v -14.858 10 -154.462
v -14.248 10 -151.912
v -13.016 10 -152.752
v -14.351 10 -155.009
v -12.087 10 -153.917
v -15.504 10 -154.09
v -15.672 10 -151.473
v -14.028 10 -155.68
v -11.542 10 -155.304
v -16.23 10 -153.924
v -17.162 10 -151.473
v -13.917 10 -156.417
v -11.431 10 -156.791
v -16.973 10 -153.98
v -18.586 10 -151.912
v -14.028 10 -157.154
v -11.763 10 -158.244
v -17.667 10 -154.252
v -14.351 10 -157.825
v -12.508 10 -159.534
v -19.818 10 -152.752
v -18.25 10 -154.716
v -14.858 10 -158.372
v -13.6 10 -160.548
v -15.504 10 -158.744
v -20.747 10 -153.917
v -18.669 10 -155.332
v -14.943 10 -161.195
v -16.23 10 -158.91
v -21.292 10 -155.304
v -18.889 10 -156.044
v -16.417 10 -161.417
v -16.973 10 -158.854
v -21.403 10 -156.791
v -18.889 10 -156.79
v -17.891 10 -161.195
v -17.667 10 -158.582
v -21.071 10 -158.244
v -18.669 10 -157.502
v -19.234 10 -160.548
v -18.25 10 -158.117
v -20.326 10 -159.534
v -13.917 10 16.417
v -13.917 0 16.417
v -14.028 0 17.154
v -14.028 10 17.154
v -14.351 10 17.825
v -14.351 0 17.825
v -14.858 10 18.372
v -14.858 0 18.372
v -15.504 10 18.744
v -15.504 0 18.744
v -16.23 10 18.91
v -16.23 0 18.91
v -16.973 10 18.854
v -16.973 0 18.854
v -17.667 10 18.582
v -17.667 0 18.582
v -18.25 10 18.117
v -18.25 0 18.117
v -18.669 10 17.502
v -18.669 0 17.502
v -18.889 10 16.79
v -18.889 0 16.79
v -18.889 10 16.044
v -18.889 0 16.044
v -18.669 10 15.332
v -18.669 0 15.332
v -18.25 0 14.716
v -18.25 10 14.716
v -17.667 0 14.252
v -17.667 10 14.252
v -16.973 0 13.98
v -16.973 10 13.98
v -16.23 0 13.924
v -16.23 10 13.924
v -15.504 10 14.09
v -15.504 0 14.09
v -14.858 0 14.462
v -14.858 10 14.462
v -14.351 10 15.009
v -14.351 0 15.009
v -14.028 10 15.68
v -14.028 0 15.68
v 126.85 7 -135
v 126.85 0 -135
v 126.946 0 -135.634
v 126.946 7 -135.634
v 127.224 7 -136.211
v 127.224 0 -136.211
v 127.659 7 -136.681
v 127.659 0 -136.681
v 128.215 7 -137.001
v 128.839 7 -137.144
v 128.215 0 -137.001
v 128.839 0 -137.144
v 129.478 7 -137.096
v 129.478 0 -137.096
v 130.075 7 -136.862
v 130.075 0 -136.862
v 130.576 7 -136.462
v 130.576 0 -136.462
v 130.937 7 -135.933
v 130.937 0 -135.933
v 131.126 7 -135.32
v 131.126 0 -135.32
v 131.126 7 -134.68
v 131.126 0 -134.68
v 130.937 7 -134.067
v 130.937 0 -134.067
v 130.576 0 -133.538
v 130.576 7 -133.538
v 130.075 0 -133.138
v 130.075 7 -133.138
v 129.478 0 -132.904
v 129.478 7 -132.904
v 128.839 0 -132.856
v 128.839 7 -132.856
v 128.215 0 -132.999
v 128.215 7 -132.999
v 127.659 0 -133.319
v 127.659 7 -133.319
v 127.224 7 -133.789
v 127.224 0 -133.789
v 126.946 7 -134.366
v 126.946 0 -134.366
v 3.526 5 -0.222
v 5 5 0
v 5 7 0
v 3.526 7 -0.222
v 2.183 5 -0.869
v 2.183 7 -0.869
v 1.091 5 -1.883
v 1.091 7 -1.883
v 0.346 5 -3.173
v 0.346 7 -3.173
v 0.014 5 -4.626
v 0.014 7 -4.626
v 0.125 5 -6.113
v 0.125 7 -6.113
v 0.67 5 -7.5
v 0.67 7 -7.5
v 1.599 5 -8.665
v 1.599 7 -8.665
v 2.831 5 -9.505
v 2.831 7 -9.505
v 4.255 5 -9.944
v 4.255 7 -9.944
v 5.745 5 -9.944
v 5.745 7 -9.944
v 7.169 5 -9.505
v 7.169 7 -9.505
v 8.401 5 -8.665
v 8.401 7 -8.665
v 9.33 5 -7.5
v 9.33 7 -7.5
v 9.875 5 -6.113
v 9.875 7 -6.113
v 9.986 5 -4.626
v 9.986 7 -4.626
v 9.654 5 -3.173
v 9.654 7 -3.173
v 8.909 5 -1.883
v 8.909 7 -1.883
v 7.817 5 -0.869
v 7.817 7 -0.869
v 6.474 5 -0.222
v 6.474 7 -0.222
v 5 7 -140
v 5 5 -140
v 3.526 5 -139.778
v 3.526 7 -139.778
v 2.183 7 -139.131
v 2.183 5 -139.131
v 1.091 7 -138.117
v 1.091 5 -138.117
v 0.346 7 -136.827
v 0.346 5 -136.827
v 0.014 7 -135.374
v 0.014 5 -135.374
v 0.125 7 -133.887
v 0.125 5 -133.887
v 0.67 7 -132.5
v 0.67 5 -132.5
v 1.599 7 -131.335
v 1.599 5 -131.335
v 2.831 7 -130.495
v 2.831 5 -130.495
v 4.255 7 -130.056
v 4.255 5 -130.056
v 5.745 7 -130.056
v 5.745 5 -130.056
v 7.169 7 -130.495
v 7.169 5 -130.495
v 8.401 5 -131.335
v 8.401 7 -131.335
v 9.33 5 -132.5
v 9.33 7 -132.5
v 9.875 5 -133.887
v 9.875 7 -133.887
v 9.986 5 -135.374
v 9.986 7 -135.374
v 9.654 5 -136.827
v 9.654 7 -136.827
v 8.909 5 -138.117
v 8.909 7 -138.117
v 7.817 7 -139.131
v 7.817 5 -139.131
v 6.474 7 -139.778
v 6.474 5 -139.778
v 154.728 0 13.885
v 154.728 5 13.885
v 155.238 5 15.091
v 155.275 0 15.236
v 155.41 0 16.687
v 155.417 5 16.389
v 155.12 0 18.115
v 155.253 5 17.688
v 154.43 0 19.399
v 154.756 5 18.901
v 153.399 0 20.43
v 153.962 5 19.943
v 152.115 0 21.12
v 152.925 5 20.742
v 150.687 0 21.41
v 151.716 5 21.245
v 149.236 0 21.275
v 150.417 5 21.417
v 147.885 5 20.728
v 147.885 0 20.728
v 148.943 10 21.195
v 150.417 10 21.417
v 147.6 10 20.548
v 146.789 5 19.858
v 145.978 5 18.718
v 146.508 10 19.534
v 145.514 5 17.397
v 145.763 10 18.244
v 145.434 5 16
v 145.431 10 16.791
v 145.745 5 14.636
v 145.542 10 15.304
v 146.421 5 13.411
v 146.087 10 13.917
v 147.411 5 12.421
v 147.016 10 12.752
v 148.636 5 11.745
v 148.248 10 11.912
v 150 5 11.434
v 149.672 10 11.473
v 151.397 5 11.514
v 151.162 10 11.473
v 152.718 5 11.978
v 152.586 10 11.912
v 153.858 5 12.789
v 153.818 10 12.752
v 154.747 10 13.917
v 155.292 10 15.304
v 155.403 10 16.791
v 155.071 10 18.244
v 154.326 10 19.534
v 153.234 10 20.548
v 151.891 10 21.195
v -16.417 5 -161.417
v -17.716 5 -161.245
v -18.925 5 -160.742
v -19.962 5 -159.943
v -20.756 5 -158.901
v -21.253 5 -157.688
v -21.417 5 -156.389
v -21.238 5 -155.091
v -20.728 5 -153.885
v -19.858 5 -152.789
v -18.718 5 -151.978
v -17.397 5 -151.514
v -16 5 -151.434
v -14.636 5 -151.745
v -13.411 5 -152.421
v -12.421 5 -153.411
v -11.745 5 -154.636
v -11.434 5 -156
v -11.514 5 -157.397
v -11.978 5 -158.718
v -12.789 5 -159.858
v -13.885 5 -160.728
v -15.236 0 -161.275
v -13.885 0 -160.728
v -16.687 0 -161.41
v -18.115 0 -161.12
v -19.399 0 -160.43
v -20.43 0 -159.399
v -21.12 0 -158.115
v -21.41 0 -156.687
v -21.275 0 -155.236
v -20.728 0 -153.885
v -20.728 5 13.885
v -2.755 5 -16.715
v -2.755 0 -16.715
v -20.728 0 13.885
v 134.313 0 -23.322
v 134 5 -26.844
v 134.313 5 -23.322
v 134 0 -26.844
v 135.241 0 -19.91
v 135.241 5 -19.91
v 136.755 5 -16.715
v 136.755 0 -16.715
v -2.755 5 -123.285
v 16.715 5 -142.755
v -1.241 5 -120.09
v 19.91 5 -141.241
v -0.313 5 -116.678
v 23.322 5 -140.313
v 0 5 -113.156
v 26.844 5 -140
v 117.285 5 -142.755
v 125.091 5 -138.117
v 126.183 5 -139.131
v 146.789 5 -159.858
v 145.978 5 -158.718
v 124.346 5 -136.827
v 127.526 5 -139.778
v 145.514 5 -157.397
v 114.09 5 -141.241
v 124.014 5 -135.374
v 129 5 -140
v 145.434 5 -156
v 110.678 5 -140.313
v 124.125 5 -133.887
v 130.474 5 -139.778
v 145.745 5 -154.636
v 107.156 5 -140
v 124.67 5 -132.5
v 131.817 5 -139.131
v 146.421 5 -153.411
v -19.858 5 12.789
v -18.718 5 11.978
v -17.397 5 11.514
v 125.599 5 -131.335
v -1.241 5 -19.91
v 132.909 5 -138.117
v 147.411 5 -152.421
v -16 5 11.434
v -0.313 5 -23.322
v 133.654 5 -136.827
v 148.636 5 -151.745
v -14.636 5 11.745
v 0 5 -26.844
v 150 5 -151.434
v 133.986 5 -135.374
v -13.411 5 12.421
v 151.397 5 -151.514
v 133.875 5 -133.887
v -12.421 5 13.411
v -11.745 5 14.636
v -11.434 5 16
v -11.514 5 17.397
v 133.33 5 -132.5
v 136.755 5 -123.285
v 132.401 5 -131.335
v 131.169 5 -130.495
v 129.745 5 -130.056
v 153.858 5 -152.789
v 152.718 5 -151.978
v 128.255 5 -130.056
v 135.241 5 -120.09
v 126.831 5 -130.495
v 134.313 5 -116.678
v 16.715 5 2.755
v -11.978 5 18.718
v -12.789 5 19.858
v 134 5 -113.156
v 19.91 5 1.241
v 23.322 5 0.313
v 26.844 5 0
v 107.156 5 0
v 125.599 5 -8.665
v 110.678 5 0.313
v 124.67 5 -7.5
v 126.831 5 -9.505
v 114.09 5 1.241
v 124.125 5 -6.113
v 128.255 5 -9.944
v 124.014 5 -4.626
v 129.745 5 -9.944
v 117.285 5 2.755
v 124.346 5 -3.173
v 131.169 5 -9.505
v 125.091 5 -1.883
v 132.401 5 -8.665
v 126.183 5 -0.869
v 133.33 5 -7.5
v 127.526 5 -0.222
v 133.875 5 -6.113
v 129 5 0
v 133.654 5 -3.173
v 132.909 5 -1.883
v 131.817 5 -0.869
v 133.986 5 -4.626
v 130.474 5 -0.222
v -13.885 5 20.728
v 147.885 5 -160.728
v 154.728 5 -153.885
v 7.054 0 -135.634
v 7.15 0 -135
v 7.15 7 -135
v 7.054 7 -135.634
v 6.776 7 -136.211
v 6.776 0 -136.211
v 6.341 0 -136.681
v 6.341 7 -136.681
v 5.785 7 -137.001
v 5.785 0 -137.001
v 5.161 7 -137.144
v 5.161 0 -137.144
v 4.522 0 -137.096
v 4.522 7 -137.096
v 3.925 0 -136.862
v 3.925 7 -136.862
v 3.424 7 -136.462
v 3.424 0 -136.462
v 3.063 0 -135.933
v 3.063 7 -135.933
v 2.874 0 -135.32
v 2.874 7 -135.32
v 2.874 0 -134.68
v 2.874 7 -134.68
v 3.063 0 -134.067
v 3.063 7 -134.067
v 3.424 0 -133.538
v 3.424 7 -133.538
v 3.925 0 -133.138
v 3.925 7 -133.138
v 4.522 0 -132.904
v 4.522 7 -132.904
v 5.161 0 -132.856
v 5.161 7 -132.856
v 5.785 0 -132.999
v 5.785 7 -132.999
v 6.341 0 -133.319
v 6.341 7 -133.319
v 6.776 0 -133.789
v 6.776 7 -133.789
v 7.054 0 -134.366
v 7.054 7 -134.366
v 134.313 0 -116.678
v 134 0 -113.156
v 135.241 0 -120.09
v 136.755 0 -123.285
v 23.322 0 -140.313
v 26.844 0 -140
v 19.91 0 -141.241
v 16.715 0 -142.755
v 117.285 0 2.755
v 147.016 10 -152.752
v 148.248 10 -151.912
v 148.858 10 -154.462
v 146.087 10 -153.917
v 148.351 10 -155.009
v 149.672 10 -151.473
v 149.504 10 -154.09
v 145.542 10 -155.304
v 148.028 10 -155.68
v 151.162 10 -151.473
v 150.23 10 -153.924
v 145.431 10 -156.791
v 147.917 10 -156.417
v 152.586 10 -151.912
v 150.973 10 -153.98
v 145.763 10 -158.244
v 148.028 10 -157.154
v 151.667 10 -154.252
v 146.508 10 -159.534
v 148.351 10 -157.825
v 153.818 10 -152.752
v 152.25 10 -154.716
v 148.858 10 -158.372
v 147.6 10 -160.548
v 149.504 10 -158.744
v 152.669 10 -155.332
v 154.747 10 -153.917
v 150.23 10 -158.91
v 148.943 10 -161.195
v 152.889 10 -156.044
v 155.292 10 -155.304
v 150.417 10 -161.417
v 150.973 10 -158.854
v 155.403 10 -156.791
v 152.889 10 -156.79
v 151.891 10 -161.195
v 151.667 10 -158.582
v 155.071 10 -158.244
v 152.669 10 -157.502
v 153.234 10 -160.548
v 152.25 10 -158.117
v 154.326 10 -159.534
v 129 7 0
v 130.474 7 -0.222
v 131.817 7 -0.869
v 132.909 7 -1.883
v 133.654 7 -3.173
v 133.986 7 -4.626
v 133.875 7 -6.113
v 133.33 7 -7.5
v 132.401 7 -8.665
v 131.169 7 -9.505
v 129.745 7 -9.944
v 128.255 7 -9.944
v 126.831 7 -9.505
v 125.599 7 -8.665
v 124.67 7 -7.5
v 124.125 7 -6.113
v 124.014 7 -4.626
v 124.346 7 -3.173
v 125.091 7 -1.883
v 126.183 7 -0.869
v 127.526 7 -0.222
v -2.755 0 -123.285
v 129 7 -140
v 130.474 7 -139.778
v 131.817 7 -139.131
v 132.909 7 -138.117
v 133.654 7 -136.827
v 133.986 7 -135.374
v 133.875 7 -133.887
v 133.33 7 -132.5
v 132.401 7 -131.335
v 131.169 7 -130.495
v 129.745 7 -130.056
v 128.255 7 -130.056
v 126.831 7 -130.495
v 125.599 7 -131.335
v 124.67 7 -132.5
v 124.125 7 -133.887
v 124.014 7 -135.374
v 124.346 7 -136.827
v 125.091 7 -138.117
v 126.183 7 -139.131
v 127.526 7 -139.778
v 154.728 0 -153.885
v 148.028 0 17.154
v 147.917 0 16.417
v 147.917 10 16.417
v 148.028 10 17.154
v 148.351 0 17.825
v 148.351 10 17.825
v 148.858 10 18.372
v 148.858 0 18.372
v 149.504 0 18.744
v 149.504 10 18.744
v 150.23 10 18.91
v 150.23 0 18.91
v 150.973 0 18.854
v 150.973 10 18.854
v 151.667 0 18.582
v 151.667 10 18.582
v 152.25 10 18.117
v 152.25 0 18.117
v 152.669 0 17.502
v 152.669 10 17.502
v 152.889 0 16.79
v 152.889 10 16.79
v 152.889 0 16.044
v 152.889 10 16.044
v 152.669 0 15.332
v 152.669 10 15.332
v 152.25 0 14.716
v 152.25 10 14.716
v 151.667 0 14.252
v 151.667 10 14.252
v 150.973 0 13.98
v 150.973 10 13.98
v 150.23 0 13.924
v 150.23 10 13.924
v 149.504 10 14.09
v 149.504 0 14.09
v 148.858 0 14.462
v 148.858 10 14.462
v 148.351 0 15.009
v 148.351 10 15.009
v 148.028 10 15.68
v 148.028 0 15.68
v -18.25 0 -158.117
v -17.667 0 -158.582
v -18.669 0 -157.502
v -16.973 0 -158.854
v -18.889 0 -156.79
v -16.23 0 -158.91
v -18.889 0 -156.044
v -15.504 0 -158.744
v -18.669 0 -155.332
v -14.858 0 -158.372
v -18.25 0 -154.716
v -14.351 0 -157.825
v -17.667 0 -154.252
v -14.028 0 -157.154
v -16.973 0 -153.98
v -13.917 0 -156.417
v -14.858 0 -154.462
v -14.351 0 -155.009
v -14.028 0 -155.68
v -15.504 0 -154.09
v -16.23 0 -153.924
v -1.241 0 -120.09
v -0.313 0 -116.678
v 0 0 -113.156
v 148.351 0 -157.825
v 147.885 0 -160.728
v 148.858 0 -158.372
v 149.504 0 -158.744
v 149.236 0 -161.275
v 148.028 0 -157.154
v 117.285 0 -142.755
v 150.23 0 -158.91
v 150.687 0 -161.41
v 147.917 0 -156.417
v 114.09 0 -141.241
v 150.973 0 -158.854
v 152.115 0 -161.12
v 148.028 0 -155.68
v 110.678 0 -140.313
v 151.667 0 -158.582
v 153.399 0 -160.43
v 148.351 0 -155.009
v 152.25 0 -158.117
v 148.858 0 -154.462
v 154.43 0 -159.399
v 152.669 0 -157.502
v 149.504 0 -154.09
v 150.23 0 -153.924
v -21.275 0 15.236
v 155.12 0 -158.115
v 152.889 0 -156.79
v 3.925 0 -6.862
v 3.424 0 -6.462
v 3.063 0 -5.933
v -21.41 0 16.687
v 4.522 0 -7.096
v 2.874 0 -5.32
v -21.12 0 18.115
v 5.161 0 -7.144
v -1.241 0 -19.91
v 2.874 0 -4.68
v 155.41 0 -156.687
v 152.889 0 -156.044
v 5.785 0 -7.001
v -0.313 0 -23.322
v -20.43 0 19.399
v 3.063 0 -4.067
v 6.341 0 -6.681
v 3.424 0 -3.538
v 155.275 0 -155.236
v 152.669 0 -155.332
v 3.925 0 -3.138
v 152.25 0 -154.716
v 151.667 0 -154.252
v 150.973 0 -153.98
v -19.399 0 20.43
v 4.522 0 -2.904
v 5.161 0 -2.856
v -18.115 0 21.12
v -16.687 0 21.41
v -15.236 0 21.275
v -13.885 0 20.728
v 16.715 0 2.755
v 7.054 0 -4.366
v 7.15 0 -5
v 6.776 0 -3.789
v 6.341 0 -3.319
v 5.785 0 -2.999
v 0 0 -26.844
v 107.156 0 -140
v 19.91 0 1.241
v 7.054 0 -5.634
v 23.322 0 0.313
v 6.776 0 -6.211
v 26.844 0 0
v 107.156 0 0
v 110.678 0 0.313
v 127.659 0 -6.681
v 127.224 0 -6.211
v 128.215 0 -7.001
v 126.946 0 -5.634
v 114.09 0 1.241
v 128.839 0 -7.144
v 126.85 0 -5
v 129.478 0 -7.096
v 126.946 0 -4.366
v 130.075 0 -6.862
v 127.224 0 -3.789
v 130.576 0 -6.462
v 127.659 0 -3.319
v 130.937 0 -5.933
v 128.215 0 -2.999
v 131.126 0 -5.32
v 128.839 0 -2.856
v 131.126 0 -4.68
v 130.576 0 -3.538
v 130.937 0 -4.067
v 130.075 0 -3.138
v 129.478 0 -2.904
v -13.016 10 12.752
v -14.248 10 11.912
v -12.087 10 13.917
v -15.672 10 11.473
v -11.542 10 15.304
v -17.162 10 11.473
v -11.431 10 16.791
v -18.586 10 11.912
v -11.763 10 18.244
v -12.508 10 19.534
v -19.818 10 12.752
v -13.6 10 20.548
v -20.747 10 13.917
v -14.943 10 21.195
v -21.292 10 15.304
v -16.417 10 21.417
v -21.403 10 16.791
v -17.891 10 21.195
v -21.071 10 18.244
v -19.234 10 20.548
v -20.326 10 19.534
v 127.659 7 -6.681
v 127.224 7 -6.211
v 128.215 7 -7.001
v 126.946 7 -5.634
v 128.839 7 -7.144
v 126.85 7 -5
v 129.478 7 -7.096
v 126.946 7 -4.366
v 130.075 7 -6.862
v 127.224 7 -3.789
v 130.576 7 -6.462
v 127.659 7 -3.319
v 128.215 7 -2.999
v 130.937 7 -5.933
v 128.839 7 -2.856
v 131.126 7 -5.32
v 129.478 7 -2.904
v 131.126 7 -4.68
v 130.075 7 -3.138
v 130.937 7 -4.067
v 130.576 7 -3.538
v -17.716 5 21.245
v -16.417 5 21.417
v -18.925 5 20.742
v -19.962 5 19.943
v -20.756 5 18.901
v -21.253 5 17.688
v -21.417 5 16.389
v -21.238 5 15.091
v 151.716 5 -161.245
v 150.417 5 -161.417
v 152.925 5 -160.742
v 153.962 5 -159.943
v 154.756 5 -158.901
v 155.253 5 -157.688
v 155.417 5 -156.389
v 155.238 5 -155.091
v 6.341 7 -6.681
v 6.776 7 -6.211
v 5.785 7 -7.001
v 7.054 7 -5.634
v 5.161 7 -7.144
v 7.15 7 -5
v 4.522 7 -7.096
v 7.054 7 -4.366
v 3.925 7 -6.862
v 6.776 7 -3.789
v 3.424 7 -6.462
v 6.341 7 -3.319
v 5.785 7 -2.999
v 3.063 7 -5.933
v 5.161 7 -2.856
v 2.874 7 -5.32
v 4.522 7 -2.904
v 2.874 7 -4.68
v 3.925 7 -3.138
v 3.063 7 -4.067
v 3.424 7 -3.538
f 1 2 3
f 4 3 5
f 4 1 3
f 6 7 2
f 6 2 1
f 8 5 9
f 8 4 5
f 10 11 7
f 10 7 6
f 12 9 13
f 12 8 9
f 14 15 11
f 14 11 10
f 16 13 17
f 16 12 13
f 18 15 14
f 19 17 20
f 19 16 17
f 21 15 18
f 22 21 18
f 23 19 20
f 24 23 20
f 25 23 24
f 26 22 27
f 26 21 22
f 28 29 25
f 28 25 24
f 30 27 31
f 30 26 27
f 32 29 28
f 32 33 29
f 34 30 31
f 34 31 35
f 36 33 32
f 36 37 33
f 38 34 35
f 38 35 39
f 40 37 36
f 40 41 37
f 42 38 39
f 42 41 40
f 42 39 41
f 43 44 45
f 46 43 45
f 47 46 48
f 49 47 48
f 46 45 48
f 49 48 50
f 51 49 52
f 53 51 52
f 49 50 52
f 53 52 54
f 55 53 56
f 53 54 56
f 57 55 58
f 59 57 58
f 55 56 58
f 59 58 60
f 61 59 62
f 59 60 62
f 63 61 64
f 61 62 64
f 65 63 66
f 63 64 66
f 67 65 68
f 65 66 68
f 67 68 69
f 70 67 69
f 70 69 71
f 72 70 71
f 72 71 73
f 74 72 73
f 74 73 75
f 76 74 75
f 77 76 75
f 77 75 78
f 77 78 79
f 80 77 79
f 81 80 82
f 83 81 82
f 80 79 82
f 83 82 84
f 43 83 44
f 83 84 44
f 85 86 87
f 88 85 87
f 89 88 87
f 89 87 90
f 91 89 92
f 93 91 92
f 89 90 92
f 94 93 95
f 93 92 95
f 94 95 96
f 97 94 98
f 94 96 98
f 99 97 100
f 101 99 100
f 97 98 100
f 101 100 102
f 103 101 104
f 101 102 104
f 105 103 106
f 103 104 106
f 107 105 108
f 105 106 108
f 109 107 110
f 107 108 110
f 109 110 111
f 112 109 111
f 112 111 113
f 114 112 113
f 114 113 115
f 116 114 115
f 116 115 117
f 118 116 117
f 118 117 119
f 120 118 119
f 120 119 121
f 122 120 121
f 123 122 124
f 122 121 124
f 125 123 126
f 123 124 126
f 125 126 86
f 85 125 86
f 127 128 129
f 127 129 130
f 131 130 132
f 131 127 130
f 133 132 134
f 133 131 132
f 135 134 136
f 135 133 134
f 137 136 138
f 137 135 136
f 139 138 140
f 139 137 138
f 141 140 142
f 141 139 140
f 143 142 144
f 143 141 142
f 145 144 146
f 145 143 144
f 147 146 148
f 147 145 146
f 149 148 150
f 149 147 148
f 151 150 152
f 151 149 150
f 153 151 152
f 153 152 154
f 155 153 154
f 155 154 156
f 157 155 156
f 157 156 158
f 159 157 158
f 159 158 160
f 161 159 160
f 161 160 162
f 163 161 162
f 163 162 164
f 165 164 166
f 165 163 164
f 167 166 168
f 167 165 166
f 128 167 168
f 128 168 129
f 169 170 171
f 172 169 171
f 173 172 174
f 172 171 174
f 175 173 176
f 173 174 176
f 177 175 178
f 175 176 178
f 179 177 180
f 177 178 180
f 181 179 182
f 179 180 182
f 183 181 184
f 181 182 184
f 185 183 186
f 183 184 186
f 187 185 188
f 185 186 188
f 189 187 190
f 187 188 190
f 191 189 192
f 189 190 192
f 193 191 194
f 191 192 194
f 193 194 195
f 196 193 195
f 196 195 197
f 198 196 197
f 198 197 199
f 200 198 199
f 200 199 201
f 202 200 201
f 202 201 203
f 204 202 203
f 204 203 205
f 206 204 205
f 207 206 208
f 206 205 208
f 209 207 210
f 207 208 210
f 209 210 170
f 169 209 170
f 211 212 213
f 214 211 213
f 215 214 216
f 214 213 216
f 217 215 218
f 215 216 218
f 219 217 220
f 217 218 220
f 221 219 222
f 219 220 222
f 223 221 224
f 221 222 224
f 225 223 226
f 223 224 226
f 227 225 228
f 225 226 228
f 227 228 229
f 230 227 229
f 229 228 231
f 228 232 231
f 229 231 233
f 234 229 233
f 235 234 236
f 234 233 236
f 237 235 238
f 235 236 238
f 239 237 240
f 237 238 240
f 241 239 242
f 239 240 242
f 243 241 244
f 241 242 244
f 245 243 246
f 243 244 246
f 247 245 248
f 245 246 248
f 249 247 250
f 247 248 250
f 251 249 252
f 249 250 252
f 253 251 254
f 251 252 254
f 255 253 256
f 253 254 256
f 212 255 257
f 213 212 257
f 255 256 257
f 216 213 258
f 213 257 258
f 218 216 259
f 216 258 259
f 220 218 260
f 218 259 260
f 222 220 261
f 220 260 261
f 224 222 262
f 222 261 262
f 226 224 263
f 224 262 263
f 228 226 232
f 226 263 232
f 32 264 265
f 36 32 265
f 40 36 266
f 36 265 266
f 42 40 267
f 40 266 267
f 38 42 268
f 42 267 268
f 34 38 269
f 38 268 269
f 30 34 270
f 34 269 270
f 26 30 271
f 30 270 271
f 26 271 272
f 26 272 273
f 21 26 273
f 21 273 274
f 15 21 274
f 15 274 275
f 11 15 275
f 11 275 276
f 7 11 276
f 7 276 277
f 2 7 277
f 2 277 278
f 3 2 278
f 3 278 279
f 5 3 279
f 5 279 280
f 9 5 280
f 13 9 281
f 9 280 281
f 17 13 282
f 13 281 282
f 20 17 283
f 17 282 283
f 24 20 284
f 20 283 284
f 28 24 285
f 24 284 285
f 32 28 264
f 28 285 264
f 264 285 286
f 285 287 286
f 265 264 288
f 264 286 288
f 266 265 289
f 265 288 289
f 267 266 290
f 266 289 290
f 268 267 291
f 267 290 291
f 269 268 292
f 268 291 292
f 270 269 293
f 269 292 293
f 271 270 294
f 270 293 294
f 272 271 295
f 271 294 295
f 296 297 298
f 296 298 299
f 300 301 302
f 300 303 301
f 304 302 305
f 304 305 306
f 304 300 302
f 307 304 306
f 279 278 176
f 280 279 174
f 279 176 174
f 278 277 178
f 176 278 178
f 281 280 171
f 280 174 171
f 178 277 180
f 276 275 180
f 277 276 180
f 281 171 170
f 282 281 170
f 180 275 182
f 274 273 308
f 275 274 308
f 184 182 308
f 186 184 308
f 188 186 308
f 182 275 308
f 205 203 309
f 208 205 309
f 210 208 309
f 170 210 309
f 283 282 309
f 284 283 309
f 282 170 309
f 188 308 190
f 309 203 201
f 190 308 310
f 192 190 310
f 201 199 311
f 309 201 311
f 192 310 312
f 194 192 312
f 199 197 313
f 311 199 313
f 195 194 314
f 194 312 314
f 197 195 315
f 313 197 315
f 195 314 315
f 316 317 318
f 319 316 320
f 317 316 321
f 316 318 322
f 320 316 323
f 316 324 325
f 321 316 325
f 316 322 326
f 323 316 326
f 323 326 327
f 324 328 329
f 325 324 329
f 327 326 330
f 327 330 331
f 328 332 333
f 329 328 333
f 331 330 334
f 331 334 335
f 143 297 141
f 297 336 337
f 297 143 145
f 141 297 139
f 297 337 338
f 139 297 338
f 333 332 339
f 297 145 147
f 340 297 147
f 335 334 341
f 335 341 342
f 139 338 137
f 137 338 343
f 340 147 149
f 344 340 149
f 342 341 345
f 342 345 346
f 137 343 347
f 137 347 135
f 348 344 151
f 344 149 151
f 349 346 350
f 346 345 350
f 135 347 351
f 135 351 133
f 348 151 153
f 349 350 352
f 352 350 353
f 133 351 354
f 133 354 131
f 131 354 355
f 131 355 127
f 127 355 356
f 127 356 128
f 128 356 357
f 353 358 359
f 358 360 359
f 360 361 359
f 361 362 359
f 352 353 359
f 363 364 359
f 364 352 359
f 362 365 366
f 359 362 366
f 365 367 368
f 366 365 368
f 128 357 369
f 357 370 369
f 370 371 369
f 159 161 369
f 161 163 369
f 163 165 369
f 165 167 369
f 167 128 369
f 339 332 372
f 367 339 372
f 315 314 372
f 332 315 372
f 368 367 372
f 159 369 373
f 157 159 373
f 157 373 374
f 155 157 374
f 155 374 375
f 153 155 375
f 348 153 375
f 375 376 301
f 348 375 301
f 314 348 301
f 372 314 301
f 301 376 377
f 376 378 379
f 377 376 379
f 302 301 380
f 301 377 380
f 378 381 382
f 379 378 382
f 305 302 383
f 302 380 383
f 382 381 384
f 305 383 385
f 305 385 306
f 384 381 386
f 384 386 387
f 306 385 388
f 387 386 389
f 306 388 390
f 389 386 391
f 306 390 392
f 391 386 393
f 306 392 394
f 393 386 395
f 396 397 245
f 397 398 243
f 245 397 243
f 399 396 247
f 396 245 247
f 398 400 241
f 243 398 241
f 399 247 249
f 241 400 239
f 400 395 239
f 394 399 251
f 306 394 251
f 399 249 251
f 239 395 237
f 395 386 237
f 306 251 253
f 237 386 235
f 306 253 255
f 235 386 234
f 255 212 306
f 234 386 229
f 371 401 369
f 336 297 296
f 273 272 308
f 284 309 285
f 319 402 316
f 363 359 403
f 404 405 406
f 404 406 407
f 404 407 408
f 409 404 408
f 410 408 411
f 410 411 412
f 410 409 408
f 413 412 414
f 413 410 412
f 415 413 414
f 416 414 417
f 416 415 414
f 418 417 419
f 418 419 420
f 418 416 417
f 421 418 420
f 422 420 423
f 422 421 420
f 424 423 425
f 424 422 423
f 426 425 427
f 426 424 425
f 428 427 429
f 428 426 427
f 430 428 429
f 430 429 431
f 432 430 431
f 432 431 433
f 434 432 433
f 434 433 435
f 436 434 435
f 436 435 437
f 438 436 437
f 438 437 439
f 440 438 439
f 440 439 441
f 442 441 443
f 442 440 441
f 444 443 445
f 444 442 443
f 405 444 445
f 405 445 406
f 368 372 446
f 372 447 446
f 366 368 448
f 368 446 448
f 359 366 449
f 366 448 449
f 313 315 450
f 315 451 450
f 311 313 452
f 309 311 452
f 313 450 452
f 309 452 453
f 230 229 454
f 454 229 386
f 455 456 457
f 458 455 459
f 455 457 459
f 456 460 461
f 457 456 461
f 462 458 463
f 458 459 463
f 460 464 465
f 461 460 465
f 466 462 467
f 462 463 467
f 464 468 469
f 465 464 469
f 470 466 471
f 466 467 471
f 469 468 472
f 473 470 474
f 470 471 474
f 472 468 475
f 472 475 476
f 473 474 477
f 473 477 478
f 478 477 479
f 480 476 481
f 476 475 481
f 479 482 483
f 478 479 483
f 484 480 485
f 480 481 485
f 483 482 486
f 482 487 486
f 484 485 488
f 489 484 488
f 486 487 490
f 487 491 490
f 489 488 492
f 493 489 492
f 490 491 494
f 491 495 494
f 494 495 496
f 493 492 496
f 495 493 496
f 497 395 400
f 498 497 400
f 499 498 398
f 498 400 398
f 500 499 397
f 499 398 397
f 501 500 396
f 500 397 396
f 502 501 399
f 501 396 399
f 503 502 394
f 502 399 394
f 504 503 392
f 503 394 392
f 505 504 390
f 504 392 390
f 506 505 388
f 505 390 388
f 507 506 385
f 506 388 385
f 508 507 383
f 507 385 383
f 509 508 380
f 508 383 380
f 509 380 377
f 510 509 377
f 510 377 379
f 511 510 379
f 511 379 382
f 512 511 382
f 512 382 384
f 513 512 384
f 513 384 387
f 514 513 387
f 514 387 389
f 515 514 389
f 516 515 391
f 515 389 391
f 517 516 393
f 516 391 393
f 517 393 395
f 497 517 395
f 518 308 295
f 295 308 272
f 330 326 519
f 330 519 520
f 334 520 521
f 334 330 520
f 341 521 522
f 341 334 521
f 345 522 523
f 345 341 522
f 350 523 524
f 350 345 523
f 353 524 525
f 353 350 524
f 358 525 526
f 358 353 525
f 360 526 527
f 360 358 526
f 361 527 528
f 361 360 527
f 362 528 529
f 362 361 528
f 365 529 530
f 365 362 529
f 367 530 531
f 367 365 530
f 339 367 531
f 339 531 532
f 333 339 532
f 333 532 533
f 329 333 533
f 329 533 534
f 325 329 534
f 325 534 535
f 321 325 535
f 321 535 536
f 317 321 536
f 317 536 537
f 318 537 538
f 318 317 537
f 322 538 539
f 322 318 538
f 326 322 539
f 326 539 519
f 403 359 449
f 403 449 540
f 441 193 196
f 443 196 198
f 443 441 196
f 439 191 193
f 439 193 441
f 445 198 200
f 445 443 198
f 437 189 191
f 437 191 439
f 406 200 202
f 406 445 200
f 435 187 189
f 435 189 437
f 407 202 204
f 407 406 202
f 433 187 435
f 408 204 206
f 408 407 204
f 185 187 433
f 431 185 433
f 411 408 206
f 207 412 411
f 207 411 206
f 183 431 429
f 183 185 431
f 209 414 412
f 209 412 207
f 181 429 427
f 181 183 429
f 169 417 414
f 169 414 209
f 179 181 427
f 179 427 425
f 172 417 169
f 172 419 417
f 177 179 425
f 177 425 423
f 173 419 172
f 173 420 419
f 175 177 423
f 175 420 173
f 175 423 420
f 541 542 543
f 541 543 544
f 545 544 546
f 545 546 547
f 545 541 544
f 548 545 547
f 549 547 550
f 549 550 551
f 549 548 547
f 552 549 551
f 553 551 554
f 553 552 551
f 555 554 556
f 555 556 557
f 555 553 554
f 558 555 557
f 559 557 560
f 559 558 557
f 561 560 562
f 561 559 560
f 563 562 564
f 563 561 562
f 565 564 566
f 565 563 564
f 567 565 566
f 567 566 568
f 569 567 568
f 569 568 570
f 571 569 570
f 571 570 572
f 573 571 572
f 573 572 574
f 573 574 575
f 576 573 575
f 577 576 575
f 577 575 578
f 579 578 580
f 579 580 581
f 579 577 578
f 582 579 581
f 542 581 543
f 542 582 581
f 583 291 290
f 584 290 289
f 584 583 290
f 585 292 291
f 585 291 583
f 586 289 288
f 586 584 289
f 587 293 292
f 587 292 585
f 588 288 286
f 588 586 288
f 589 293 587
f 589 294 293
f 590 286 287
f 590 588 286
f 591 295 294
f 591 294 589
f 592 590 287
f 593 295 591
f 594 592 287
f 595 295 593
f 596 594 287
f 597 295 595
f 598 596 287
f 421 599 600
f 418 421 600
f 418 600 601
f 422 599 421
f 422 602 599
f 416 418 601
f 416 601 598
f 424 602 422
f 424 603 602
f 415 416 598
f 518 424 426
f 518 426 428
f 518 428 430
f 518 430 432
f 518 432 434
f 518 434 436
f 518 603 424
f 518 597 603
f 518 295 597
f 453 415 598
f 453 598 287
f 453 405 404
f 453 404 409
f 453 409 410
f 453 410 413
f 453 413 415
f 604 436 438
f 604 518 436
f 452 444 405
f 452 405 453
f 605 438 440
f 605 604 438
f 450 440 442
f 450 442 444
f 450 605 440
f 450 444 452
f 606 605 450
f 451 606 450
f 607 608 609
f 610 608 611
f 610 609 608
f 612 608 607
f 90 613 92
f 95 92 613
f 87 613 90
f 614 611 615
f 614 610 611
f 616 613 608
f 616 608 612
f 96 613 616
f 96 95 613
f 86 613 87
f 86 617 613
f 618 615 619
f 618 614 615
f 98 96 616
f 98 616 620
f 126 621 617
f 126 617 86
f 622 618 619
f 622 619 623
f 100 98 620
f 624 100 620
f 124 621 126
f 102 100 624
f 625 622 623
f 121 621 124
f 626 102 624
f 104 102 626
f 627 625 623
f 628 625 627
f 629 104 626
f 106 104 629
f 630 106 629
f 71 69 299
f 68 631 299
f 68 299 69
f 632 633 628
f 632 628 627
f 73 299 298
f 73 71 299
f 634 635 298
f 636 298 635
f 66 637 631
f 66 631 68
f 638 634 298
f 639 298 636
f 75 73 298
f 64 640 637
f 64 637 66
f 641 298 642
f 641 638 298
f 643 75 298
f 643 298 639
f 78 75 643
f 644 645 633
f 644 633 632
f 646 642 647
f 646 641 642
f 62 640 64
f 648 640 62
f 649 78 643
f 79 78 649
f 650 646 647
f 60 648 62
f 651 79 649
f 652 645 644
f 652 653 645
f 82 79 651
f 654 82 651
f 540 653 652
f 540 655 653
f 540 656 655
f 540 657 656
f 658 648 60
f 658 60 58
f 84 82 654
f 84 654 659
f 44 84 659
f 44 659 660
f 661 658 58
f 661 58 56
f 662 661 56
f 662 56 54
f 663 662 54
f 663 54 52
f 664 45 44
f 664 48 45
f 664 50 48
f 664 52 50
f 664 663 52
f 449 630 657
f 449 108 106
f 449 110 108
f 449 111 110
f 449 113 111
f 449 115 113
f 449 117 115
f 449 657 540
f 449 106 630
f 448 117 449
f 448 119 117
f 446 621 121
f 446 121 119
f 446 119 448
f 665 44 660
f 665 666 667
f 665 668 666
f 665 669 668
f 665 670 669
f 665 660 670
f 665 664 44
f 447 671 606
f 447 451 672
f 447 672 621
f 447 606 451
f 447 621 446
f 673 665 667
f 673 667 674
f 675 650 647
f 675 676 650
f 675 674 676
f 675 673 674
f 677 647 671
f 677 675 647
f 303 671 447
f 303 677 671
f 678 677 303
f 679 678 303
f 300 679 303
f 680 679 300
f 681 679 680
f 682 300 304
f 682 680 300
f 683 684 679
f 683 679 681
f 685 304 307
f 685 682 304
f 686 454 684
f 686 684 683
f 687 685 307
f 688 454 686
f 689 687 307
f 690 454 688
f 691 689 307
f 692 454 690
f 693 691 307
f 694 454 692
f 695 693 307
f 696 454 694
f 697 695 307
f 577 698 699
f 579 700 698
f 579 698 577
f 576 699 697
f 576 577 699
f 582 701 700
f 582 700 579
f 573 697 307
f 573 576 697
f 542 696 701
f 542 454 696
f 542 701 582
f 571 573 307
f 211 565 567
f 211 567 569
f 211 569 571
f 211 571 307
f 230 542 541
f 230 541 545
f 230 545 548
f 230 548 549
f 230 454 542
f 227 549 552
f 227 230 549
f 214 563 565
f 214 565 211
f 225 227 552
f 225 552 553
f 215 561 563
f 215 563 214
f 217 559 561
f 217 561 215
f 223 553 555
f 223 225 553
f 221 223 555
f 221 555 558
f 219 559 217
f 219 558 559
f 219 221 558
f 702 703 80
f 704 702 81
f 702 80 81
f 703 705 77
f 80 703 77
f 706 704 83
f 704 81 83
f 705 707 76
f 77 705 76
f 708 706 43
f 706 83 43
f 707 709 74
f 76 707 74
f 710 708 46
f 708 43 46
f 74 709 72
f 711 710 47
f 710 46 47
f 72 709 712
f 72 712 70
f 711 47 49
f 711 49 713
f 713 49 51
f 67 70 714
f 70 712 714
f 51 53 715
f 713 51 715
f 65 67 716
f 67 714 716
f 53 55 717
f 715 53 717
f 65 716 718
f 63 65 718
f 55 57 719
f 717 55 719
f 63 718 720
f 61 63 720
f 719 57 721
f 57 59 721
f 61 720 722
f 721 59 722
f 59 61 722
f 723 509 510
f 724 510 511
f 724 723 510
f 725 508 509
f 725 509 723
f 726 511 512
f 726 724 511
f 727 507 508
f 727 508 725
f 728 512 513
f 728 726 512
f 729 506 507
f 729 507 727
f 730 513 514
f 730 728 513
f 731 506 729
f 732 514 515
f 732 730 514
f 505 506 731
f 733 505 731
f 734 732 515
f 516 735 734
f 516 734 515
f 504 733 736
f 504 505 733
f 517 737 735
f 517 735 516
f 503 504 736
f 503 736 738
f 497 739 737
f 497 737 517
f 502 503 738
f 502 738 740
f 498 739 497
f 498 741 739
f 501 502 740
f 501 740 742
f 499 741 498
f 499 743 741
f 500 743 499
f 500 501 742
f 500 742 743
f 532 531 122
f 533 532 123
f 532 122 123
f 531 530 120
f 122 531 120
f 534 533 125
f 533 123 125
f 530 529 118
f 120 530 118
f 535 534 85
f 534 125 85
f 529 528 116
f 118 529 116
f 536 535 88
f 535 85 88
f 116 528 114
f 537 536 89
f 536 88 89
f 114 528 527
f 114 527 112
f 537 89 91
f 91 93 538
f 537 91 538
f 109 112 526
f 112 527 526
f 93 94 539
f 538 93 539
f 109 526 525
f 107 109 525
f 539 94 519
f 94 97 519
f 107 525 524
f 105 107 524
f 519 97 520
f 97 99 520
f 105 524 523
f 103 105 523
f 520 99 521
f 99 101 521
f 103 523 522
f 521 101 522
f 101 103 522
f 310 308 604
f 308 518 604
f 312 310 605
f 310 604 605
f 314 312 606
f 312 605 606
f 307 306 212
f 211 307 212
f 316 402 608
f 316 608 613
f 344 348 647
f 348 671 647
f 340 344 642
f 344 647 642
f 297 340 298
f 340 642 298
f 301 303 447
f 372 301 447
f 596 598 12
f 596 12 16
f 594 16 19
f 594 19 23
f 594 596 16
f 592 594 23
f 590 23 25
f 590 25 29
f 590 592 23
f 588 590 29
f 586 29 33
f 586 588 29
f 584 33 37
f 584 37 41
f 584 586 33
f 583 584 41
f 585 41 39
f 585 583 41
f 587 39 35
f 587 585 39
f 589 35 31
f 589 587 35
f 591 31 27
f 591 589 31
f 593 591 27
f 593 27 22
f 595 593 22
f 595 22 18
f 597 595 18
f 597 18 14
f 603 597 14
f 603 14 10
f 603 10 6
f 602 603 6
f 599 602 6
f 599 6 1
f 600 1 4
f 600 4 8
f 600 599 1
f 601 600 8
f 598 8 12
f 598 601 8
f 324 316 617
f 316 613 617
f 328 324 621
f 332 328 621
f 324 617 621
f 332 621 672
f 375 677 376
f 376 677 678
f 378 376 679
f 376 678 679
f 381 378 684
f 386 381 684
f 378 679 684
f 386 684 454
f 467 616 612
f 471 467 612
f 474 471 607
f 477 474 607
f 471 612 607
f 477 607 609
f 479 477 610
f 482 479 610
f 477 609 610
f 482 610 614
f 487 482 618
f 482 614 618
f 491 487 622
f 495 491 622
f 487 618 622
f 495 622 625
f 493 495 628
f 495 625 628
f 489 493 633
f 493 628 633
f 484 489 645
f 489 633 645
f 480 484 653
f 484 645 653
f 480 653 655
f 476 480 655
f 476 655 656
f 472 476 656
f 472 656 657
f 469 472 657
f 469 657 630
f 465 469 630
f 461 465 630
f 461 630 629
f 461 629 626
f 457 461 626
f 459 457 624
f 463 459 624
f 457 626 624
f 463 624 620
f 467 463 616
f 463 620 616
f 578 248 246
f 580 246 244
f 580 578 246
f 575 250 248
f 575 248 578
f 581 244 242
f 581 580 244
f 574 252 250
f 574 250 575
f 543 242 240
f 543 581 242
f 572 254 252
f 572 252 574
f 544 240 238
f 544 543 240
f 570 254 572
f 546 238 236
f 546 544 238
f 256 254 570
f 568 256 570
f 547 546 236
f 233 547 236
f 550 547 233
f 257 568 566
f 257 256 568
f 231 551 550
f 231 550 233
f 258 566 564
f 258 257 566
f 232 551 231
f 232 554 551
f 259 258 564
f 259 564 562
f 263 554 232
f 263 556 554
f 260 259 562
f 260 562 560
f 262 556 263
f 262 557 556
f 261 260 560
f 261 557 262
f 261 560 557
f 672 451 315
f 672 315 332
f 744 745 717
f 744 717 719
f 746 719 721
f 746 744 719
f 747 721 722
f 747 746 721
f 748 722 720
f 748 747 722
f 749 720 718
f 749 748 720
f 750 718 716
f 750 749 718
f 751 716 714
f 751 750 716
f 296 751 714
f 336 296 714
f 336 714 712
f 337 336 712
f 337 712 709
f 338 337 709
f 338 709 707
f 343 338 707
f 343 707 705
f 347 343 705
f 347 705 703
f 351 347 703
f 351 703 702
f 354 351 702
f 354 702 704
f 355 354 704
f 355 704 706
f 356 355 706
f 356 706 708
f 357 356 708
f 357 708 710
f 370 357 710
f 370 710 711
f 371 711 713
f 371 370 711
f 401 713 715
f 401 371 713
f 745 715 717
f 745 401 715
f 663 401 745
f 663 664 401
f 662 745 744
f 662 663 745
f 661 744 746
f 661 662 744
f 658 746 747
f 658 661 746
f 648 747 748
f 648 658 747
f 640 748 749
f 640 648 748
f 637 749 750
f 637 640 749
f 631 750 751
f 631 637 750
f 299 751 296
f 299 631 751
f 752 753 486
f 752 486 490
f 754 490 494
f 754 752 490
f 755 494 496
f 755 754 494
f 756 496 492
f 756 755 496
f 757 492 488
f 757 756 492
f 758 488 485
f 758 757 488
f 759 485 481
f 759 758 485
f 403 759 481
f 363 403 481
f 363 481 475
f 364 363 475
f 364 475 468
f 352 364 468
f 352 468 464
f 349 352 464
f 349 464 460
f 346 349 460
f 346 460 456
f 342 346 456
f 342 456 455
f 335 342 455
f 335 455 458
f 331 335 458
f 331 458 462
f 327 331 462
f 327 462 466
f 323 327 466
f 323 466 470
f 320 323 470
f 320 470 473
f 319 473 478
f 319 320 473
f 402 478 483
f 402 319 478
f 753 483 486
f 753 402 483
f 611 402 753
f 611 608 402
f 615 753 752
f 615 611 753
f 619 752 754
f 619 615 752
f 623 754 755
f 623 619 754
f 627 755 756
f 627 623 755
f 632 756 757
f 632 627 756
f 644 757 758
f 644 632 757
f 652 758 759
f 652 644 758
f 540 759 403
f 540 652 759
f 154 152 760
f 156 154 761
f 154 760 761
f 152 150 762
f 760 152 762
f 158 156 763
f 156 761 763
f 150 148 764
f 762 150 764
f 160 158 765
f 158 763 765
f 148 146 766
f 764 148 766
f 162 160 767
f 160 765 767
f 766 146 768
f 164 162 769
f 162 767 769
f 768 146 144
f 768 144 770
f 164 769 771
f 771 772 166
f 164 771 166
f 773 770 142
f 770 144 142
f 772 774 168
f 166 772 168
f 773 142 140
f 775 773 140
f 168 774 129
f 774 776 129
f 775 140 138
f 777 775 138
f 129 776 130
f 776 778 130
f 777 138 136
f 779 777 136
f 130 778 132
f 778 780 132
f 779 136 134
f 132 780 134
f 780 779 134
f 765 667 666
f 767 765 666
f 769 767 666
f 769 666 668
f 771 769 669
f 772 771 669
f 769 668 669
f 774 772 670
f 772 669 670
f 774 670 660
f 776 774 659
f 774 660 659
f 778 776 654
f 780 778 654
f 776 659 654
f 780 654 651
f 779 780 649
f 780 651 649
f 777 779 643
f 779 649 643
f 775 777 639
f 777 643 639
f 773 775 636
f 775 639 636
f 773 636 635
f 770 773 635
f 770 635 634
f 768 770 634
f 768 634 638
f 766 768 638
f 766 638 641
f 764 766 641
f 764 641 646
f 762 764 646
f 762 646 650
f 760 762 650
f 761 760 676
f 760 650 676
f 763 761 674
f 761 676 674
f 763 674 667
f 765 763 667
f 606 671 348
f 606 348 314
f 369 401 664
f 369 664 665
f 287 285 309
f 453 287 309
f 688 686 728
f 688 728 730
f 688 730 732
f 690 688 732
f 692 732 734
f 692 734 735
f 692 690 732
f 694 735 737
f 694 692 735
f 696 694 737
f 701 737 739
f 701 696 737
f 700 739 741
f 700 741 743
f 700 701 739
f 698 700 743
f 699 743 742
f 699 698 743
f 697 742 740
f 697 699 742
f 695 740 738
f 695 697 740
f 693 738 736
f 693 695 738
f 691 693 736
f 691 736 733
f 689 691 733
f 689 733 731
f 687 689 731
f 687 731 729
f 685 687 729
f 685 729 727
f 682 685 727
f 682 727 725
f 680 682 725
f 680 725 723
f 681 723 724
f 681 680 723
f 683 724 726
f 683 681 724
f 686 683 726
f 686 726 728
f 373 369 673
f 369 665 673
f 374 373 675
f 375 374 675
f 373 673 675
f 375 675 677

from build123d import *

# Parameters (mm, degrees)
SKETCH1_W                                  = 134
SKETCH1_H                                  = 140
BOSS_EXTRUDE1_DEPTH                        = 5
BOSS_EXTRUDE3_DEPTH                        = 5
SKETCH3_R                                  = 5
BOSS_EXTRUDE4_DEPTH                        = 5
HOLE1_OUTLINE_R                            = 2.5
HOLE1_DEPTH                                = 10
SKETCH6_R                                  = 5
BOSS_EXTRUDE5_DEPTH                        = 2
HOLE2_OUTLINE_R                            = 2.15
HOLE2_DEPTH                                = 7
MIRROR1_AT_THE_SECOND_PLANE_COPY_1_DEPTH   = 5
MIRROR1_AT_THE_SECOND_PLANE_COPY_2_SKETC_R = 5
MIRROR1_AT_THE_SECOND_PLANE_COPY_2_DEPTH   = 5
MIRROR1_AT_THE_SECOND_PLANE_COPY_3_SKETC_R = 2.5
MIRROR1_AT_THE_SECOND_PLANE_COPY_3_DEPTH   = 10
MIRROR1_AT_THE_SECOND_PLANE_COPY_4_SKETC_R = 5
MIRROR1_AT_THE_SECOND_PLANE_COPY_4_DEPTH   = 2
MIRROR1_AT_THE_SECOND_PLANE_COPY_5_SKETC_R = 2.15
MIRROR1_AT_THE_SECOND_PLANE_COPY_5_DEPTH   = 7
CUT_EXTRUDE_THIN1_DEPTH                    = 232.199441913
MIRROR2_AT_THE_SECOND_PLANE_COPY_1_DEPTH   = 232.199441913
FILLET1_R                                  = 20


# Read off the part's stored shape, not the designer's step: Hole1, Hole2
with BuildPart() as part:
    # Sketch1 → Boss-Extrude1 (new body)
    with BuildSketch(Plane(origin=(0, 0, 0), x_dir=(1, 0, 0), z_dir=(0, 1, 0))):
        with Locations((67, 70)):
            Rectangle(SKETCH1_W, SKETCH1_H)
    extrude(amount=BOSS_EXTRUDE1_DEPTH)

    # Sketch2 → Boss-Extrude3 (add)
    with BuildSketch(Plane(origin=(0, 5, 0), x_dir=(1, 0, 0), z_dir=(0, 1, 0))):
        with BuildLine():
            Line((0, 118.595175856), (-24.35045716, 150.329309467))
            ThreePointArc((-24.35045716, 150.329309467), (-23.487991569, 163.487991569), (-10.329309467, 164.35045716))
            Line((-10.329309467, 164.35045716), (21.404824144, 140))
            Line((21.404824144, 140), (0, 140))
            Line((0, 140), (0, 118.595175856))
        make_face()
    boss_extrude3 = extrude(amount=-BOSS_EXTRUDE3_DEPTH)

    # Sketch3 → Boss-Extrude4 (add)
    with BuildSketch(Plane(origin=(0, 5, 0), x_dir=(1, 0, 0), z_dir=(0, 1, 0))):
        with Locations(Location((-16.416923757, 156.416923757, 0), (0, 0, 90))):
            Circle(SKETCH3_R)
    boss_extrude4 = extrude(amount=BOSS_EXTRUDE4_DEPTH)

    # Hole1 outline → Hole1 (cut)
    with BuildSketch(Plane(origin=(0, 0, 0), x_dir=(1, 0, 0), z_dir=(0, 1, 0))):
        with Locations((-16.416923757, 156.416923757)):
            Circle(HOLE1_OUTLINE_R)
    hole1 = extrude(amount=HOLE1_DEPTH, mode=Mode.SUBTRACT)

    # Sketch6 → Boss-Extrude5 (add)
    with BuildSketch(Plane(origin=(0, 5, 0), x_dir=(1, 0, 0), z_dir=(0, 1, 0))):
        with Locations(Location((5, 135, 0), (0, 0, 90))):
            Circle(SKETCH6_R)
    boss_extrude5 = extrude(amount=BOSS_EXTRUDE5_DEPTH)

    # Hole2 outline → Hole2 (cut)
    with BuildSketch(Plane(origin=(0, 0, 0), x_dir=(1, 0, 0), z_dir=(0, 1, 0))):
        with Locations((5, 135)):
            Circle(HOLE2_OUTLINE_R)
    hole2 = extrude(amount=HOLE2_DEPTH, mode=Mode.SUBTRACT)

    # Mirror1: Boss-Extrude3, Boss-Extrude4, Hole1, Boss-Extrude5, Hole2 across plane
    add(boss_extrude3.mirror(Plane.XY.offset(-70)))
    add(boss_extrude4.mirror(Plane.XY.offset(-70)))
    add(hole1.mirror(Plane.XY.offset(-70)), mode=Mode.SUBTRACT)
    add(boss_extrude5.mirror(Plane.XY.offset(-70)))
    add(hole2.mirror(Plane.XY.offset(-70)), mode=Mode.SUBTRACT)

    # Mirror1 at the second plane: Boss-Extrude3, Boss-Extrude4, Hole1, Boss-Extrude5, Hole2 across plane
    add(boss_extrude3.mirror(Plane.ZY.offset(-67)))
    add(boss_extrude4.mirror(Plane.ZY.offset(-67)))
    add(hole1.mirror(Plane.ZY.offset(-67)), mode=Mode.SUBTRACT)
    add(boss_extrude5.mirror(Plane.ZY.offset(-67)))
    add(hole2.mirror(Plane.ZY.offset(-67)), mode=Mode.SUBTRACT)

    # Mirror1 at the second plane copy 1 sketc → Mirror1 at the second plane copy 1 (add)
    with BuildSketch(Plane(origin=(134, 5, -140), x_dir=(-1, 0, 0), z_dir=(0, 1, 0))):
        with BuildLine():
            Line((0, 118.595175856), (-24.35045716, 150.329309467))
            ThreePointArc((-24.35045716, 150.329309467), (-23.487991569, 163.487991569), (-10.329309467, 164.35045716))
            Line((-10.329309467, 164.35045716), (21.404824144, 140))
            Line((21.404824144, 140), (0, 140))
            Line((0, 140), (0, 118.595175856))
        make_face()
    extrude(amount=-MIRROR1_AT_THE_SECOND_PLANE_COPY_1_DEPTH)

    # Mirror1 at the second plane copy 2 sketc → Mirror1 at the second plane copy 2 (add)
    with BuildSketch(Plane(origin=(134, 5, -140), x_dir=(-1, 0, 0), z_dir=(0, 1, 0))):
        with Locations(Location((-16.416923757, 156.416923757, 0), (0, 0, 90))):
            Circle(MIRROR1_AT_THE_SECOND_PLANE_COPY_2_SKETC_R)
    extrude(amount=MIRROR1_AT_THE_SECOND_PLANE_COPY_2_DEPTH)

    # Mirror1 at the second plane copy 3 sketc → Mirror1 at the second plane copy 3 (cut)
    with BuildSketch(Plane(origin=(134, 0, -140), x_dir=(-1, 0, 0), z_dir=(0, 1, 0))):
        with Locations((-16.416923757, 156.416923757)):
            Circle(MIRROR1_AT_THE_SECOND_PLANE_COPY_3_SKETC_R)
    extrude(amount=MIRROR1_AT_THE_SECOND_PLANE_COPY_3_DEPTH, mode=Mode.SUBTRACT)

    # Mirror1 at the second plane copy 4 sketc → Mirror1 at the second plane copy 4 (add)
    with BuildSketch(Plane(origin=(134, 5, -140), x_dir=(-1, 0, 0), z_dir=(0, 1, 0))):
        with Locations(Location((5, 135, 0), (0, 0, 90))):
            Circle(MIRROR1_AT_THE_SECOND_PLANE_COPY_4_SKETC_R)
    extrude(amount=MIRROR1_AT_THE_SECOND_PLANE_COPY_4_DEPTH)

    # Mirror1 at the second plane copy 5 sketc → Mirror1 at the second plane copy 5 (cut)
    with BuildSketch(Plane(origin=(134, 0, -140), x_dir=(-1, 0, 0), z_dir=(0, 1, 0))):
        with Locations((5, 135)):
            Circle(MIRROR1_AT_THE_SECOND_PLANE_COPY_5_SKETC_R)
    extrude(amount=MIRROR1_AT_THE_SECOND_PLANE_COPY_5_DEPTH, mode=Mode.SUBTRACT)

    # Sketch9 → Cut-Extrude-Thin1 (cut, symmetric)
    with BuildSketch(Plane(origin=(0, 5, 0), x_dir=(1, 0, 0), z_dir=(0, 1, 0))):
        with BuildLine():
            Line((0, 118.595175856), (-20.728209423, 153.88456993))
            ThreePointArc((-20.728209423, 153.88456993), (-19.952457663, 159.952457663), (-13.88456993, 160.728209423))
            Line((-13.88456993, 160.728209423), (21.404824144, 140))
            Line((21.404824144, 140), (26.4695318, 148.622571331))
            Line((26.4695318, 148.622571331), (-8.819862274, 169.350780755))
            ThreePointArc((-8.819862274, 169.350780755), (-27.023525475, 167.023525475), (-29.350780755, 148.819862274))
            Line((-29.350780755, 148.819862274), (-8.622571331, 113.5304682))
            Line((-8.622571331, 113.5304682), (0, 118.595175856))
        make_face()
    cut_extrude_thin1 = extrude(amount=CUT_EXTRUDE_THIN1_DEPTH, both=True, mode=Mode.SUBTRACT)

    # Mirror2: Cut-Extrude-Thin1 across plane
    add(cut_extrude_thin1.mirror(Plane.ZY.offset(-67)), mode=Mode.SUBTRACT)

    # Mirror2 at the second plane: Cut-Extrude-Thin1 across plane
    add(cut_extrude_thin1.mirror(Plane.XY.offset(-70)), mode=Mode.SUBTRACT)

    # Mirror2 at the second plane copy 1 sketc → Mirror2 at the second plane copy 1 (cut, symmetric)
    with BuildSketch(Plane(origin=(134, 5, -140), x_dir=(-1, 0, 0), z_dir=(0, 1, 0))):
        with BuildLine():
            Line((0, 118.595175856), (-20.728209423, 153.88456993))
            ThreePointArc((-20.728209423, 153.88456993), (-19.952457663, 159.952457663), (-13.88456993, 160.728209423))
            Line((-13.88456993, 160.728209423), (21.404824144, 140))
            Line((21.404824144, 140), (26.4695318, 148.622571331))
            Line((26.4695318, 148.622571331), (-8.819862274, 169.350780755))
            ThreePointArc((-8.819862274, 169.350780755), (-27.023525475, 167.023525475), (-29.350780755, 148.819862274))
            Line((-29.350780755, 148.819862274), (-8.622571331, 113.5304682))
            Line((-8.622571331, 113.5304682), (0, 118.595175856))
        make_face()
    extrude(amount=MIRROR2_AT_THE_SECOND_PLANE_COPY_1_DEPTH, both=True, mode=Mode.SUBTRACT)

    # Fillet1
    fillet1_edges = [part.edges().sort_by_distance(p)[0] for p in [
        (0, 2.5, -118.595175856),
        (21.404824144, 2.5, -140),
        (112.595175856, 2.5, -140),
        (134, 2.5, -118.595175856),
        (21.404824144, 2.5, 0),
        (0, 2.5, -21.404824144),
        (134, 2.5, -21.404824144),
        (112.595175856, 2.5, 0),
    ]]
    fillet(fillet1_edges, radius=FILLET1_R)


solid = part.part
